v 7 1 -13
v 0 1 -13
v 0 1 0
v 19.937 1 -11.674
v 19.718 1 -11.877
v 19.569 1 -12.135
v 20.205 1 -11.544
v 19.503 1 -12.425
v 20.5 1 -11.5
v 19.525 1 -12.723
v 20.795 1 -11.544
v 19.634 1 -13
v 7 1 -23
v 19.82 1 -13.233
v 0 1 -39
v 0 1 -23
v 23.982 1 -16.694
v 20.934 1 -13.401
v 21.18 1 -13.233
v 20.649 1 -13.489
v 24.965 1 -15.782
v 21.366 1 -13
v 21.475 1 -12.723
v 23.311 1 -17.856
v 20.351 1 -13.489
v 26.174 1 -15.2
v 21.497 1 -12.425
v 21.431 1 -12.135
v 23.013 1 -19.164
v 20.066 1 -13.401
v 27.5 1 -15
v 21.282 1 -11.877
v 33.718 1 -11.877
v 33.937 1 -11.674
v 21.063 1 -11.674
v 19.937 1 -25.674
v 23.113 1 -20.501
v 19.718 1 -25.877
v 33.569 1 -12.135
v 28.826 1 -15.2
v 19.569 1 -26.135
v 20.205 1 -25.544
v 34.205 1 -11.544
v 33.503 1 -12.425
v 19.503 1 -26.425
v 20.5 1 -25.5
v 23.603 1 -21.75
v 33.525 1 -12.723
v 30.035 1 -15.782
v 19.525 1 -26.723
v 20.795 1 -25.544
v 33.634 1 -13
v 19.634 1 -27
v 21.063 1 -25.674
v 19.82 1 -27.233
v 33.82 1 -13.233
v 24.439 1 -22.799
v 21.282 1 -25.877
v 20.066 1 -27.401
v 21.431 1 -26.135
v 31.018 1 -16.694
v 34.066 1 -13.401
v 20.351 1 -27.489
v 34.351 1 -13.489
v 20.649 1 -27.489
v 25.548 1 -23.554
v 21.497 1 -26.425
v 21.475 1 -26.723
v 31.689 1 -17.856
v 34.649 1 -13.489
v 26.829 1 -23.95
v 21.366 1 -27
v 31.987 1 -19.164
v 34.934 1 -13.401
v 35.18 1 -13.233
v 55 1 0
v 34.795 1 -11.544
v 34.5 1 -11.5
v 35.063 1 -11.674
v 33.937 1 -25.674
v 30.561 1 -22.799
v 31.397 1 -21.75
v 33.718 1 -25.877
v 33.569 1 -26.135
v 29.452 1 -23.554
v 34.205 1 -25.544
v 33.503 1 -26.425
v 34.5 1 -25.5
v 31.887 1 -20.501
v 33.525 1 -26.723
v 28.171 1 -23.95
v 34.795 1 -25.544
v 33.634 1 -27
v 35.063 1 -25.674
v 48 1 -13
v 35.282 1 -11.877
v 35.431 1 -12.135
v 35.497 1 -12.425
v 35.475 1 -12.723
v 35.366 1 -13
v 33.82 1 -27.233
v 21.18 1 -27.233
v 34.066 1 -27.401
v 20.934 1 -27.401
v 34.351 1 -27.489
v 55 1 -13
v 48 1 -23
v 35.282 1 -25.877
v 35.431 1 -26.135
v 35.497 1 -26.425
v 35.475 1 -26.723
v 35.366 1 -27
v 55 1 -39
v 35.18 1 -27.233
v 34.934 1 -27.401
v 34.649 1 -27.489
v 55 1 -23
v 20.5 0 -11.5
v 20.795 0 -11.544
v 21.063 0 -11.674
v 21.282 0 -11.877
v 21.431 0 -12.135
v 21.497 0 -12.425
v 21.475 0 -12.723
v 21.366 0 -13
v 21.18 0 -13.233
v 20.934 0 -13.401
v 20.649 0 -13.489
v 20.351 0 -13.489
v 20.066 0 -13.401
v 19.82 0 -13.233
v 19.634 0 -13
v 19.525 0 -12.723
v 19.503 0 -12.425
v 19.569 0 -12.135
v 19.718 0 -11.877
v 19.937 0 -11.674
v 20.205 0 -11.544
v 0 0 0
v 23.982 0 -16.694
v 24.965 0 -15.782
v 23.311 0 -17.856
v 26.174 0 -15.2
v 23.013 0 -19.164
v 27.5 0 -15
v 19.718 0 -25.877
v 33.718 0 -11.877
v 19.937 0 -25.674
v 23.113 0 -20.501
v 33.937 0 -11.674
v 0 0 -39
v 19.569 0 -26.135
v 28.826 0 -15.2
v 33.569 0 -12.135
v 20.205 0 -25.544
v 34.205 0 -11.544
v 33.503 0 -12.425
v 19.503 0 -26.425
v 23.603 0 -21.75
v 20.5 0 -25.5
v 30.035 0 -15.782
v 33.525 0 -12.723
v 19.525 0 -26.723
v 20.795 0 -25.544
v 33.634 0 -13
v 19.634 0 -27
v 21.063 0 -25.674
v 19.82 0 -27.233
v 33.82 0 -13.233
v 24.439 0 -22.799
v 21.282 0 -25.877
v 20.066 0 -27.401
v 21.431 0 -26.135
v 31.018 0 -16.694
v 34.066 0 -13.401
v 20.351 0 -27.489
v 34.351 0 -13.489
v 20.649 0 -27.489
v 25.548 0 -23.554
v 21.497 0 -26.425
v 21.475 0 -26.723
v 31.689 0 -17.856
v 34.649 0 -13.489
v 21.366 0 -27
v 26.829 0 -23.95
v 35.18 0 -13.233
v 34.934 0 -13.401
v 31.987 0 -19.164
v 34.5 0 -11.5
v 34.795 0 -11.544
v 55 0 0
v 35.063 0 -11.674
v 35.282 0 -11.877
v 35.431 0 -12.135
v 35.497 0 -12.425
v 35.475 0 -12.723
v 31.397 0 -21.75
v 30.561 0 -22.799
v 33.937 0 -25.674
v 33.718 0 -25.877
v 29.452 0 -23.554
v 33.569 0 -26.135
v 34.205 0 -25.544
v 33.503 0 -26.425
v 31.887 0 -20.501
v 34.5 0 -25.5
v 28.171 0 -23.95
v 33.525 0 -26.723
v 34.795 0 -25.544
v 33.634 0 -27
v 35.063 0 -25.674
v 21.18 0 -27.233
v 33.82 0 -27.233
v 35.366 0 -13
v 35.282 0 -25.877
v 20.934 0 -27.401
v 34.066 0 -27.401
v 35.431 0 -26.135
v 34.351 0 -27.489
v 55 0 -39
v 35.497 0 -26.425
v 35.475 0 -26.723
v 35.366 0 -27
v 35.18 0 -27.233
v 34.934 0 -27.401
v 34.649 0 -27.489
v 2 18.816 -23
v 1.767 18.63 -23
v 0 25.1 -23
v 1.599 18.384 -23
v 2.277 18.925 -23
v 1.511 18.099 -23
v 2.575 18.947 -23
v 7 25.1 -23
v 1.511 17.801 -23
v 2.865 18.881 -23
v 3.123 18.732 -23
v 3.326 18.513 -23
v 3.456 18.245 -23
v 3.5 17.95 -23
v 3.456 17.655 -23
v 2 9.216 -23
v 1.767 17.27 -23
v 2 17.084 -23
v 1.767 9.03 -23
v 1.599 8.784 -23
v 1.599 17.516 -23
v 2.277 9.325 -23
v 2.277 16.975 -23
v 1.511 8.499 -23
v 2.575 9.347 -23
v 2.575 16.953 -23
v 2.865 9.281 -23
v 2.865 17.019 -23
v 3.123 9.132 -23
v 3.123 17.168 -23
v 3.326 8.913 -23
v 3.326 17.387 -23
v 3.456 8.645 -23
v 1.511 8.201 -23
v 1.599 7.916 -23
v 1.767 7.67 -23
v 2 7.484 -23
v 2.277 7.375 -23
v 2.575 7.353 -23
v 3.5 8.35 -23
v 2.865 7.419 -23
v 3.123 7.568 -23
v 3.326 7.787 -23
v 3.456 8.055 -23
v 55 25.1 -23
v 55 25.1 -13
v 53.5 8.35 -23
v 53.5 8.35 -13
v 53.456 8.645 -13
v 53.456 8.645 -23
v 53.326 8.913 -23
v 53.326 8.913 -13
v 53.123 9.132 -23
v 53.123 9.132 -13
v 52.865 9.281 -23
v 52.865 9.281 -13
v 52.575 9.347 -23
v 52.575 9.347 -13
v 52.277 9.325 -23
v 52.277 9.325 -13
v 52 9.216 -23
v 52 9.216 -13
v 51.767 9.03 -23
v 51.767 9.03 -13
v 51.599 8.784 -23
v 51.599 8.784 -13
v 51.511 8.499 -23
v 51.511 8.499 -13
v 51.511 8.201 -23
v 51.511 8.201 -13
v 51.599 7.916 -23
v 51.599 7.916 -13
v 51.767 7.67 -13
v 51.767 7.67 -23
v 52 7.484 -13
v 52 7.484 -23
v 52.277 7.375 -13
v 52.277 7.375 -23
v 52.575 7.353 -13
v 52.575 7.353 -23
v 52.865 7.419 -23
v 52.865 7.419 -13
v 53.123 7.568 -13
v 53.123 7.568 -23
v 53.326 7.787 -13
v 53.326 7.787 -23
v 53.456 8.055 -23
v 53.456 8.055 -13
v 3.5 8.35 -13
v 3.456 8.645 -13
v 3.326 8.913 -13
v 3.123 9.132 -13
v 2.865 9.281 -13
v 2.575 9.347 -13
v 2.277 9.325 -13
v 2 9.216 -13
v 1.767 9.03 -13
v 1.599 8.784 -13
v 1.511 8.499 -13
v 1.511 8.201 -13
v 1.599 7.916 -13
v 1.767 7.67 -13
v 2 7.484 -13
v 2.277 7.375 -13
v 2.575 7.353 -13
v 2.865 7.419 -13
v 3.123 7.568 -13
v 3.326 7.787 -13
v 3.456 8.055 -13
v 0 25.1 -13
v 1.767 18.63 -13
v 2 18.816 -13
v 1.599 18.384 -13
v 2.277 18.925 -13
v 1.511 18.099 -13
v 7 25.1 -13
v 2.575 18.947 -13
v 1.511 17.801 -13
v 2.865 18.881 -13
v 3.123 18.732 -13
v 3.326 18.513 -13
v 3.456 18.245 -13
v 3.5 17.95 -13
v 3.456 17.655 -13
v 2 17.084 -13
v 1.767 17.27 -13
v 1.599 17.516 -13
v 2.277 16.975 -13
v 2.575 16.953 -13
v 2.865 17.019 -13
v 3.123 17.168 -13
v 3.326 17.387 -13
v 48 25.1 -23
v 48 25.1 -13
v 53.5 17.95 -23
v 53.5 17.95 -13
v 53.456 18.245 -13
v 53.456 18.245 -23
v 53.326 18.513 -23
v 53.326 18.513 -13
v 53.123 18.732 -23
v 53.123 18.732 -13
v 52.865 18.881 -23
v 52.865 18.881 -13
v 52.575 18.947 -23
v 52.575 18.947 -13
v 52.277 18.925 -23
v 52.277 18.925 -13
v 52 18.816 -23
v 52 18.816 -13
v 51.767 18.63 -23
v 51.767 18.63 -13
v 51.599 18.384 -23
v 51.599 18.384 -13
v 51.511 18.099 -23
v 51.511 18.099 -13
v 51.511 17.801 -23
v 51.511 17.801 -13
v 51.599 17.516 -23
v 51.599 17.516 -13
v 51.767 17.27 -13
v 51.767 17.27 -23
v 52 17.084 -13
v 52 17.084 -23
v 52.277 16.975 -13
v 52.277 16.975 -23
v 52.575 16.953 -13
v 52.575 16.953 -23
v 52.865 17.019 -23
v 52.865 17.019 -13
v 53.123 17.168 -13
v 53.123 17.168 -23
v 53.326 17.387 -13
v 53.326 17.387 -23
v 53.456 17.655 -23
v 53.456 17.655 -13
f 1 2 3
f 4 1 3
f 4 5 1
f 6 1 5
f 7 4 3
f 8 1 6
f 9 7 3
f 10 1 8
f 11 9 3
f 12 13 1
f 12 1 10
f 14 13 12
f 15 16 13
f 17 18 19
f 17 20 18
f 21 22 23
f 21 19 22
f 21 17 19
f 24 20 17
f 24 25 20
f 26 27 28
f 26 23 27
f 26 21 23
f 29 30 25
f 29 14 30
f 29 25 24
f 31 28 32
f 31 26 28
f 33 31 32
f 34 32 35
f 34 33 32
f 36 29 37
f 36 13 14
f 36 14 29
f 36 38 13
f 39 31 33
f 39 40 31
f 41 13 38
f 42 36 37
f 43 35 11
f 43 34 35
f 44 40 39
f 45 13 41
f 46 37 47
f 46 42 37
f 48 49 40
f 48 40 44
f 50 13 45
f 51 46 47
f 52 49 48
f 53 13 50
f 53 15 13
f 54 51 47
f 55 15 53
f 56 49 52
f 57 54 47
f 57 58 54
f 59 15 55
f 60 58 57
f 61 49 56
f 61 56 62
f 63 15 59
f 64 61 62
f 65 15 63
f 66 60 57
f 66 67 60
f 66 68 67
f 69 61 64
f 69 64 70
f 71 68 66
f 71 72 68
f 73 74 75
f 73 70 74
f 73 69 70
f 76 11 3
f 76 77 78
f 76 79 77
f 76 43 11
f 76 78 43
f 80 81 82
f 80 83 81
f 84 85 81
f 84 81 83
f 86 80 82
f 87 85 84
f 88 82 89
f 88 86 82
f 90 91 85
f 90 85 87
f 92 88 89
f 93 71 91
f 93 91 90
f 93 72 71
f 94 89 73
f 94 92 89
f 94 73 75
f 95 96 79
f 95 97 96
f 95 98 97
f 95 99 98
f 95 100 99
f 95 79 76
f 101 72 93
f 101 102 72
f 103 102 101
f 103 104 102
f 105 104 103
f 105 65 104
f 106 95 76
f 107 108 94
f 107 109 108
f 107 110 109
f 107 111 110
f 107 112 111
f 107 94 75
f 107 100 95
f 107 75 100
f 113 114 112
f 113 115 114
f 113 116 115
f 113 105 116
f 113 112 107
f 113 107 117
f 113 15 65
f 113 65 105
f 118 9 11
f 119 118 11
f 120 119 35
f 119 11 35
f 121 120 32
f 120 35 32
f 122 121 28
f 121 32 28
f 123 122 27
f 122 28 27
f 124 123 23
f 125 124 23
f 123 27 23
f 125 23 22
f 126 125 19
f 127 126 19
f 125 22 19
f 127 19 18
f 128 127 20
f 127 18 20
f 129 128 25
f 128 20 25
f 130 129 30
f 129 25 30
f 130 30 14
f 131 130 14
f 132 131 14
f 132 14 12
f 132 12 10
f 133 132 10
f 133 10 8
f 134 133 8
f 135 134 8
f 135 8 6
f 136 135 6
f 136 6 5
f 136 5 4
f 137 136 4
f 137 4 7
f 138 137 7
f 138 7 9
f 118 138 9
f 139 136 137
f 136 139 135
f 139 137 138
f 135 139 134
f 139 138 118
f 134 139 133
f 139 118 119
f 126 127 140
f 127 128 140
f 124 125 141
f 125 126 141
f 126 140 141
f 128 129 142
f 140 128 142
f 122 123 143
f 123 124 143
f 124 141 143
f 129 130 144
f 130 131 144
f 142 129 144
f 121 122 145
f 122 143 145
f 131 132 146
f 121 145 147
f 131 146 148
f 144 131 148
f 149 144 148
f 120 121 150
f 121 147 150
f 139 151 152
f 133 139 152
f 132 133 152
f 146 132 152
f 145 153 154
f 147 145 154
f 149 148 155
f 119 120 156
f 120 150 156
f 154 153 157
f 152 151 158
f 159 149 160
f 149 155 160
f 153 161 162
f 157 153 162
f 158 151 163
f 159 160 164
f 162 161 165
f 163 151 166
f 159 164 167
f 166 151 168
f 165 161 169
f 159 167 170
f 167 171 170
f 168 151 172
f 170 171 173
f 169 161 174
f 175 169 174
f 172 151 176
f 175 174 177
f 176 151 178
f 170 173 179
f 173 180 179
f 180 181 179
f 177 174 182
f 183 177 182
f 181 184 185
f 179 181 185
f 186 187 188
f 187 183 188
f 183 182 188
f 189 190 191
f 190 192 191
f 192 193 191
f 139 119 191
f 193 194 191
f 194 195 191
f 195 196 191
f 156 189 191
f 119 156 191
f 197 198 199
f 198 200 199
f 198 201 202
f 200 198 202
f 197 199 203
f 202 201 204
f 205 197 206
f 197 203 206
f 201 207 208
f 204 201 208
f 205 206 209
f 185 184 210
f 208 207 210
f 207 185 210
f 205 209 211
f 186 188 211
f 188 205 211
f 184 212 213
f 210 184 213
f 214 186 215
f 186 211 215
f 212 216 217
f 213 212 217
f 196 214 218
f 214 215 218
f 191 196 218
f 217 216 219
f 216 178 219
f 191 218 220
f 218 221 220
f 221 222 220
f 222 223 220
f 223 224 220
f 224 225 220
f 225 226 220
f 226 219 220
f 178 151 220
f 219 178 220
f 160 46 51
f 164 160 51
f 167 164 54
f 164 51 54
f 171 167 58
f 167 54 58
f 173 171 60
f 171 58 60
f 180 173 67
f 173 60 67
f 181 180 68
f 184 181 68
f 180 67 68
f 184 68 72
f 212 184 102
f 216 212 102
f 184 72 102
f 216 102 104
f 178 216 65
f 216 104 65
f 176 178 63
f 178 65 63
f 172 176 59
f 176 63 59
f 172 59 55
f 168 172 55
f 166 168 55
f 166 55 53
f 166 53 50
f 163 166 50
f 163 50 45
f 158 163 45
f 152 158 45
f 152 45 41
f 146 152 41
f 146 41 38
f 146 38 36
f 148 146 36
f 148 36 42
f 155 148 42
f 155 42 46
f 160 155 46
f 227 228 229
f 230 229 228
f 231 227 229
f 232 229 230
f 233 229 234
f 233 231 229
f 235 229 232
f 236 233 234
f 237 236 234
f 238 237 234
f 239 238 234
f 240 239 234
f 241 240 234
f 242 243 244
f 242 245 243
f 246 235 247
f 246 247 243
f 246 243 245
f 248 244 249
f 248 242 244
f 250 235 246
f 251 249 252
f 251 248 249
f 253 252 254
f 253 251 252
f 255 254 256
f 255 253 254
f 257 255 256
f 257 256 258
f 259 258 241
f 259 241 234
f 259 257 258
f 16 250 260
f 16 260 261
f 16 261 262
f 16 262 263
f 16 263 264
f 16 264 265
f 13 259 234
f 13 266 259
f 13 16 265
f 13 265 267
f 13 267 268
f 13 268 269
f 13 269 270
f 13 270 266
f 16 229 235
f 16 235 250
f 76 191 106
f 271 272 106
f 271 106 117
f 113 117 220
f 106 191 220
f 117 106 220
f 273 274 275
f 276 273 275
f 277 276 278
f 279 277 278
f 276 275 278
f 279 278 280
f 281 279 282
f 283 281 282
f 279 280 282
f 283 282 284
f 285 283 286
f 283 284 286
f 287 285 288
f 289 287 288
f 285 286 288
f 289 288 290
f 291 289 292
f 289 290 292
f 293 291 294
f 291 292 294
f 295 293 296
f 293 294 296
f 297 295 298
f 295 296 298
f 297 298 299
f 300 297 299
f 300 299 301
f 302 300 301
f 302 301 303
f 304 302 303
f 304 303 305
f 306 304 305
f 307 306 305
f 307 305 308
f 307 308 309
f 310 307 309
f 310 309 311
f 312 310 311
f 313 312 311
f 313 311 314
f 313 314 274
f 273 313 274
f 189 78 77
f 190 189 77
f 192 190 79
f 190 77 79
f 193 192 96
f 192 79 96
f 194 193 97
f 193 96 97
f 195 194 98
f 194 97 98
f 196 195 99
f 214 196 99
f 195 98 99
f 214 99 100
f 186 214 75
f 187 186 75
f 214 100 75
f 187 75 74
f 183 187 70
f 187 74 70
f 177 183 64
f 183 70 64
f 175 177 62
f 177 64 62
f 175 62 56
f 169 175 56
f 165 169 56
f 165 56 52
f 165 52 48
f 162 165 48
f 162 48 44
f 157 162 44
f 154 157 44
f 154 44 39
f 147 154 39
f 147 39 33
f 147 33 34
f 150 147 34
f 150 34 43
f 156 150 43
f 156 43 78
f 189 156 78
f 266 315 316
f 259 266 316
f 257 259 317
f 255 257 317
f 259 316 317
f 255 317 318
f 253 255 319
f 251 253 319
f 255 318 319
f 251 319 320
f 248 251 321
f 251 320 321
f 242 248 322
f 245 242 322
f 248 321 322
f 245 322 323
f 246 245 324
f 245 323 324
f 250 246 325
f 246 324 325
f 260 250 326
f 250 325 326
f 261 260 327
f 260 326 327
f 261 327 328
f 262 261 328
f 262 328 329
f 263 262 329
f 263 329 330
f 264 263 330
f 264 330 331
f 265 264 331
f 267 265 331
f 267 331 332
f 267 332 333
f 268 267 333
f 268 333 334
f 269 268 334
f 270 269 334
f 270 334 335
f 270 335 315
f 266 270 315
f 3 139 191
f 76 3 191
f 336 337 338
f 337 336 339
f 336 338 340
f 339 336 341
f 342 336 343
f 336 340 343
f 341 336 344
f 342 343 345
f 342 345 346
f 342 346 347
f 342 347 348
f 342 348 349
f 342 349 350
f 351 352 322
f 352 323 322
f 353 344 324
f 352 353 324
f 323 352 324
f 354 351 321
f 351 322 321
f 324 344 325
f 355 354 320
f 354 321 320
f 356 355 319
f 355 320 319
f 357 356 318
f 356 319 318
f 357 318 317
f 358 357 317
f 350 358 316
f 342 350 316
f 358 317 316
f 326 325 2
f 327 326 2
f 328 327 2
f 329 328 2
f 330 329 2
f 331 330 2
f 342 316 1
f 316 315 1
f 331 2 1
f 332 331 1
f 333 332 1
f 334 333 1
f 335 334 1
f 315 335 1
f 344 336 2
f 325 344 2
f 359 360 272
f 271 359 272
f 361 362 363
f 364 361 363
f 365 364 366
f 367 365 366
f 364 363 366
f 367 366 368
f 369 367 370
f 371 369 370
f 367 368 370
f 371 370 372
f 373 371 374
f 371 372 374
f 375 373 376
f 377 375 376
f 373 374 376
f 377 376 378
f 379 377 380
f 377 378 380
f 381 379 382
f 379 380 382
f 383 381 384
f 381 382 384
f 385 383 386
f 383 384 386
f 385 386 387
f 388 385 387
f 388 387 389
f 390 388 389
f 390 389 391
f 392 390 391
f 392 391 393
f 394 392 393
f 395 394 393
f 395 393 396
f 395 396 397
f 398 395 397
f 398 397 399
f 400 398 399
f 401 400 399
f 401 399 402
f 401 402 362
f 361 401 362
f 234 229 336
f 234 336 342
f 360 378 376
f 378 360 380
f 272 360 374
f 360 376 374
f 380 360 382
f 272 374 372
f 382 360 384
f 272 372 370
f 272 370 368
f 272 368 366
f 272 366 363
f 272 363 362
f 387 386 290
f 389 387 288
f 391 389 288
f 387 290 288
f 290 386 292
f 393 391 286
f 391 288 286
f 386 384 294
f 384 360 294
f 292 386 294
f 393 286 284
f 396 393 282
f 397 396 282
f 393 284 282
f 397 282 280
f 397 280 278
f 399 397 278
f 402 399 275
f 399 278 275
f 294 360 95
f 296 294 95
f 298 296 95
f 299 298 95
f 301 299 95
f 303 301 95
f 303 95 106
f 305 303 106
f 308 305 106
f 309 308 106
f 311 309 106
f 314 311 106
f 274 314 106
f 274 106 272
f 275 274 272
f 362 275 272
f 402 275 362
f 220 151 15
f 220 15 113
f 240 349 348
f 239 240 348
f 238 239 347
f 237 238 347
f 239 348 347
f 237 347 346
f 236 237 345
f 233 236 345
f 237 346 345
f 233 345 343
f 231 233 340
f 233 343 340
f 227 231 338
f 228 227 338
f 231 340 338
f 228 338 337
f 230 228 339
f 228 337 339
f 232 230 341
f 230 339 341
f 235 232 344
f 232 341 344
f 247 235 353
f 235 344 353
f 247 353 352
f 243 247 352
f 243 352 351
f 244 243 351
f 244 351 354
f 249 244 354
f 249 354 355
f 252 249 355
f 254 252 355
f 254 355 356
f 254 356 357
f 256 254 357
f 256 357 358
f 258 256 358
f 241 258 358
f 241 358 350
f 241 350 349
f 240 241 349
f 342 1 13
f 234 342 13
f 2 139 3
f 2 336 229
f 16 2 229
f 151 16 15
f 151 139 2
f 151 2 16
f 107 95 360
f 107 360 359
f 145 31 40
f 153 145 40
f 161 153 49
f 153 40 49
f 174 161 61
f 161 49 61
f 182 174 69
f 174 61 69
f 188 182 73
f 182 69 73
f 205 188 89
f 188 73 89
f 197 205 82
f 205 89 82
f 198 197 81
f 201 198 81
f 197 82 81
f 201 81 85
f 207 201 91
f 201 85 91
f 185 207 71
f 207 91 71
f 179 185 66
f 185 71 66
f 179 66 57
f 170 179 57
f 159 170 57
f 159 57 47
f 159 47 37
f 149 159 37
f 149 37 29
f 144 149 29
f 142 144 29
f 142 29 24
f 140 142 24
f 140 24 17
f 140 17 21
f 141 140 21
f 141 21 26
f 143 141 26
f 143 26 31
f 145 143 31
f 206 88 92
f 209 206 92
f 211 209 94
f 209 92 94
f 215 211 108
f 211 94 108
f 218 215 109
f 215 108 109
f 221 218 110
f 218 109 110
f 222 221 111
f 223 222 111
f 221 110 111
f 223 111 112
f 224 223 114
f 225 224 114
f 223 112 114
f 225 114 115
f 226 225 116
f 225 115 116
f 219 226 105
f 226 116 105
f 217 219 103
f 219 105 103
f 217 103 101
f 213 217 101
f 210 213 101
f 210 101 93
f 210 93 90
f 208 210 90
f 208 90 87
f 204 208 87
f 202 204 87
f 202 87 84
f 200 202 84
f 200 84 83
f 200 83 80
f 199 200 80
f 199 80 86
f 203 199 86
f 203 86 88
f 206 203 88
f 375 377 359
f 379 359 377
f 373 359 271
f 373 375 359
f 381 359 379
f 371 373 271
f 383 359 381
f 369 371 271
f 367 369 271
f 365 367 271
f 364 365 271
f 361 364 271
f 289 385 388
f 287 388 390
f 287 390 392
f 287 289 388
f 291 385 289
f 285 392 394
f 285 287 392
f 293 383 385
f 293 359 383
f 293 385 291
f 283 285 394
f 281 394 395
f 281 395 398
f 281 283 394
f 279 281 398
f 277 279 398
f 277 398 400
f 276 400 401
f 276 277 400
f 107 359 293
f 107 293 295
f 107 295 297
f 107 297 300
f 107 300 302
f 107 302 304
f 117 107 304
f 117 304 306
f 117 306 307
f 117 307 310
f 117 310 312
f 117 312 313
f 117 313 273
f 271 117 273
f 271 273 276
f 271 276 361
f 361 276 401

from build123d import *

# Parameters (mm, degrees)
SKETCH1_W           = 55
SKETCH1_H           = 39
BOSS_EXTRUDE1_DEPTH = 1
CUT_EXTRUDE1_REACH  = 69.431
SKETCH3_R           = 1
SKETCH3_R_2         = 4.5
SKETCH2_W           = 7
SKETCH2_H           = 10
BOSS_EXTRUDE2_DEPTH = 24.1
CUT_EXTRUDE2_REACH  = 67.81
SKETCH4_R           = 1


with BuildPart() as part:
    # Sketch1 → Boss-Extrude1 (new body)
    with BuildSketch(Plane(origin=(0, 0, 0), x_dir=(1, 0, 0), z_dir=(0, 1, 0))):
        with Locations((27.5, 19.5)):
            Rectangle(SKETCH1_W, SKETCH1_H)
    extrude(amount=BOSS_EXTRUDE1_DEPTH)

    # Sketch3 → Cut-Extrude1 (cut, up to next)
    with BuildSketch(Plane(origin=(0, 1, 0), x_dir=(1, 0, 0), z_dir=(0, 1, 0)), mode=Mode.PRIVATE) as cut_extrude1_sk1:
        with Locations(Location((34.5, 26.5, 0), (0, 0, 270))):
            Circle(SKETCH3_R)
    cut_extrude1_tool1 = extrude(cut_extrude1_sk1.sketch, amount=-CUT_EXTRUDE1_REACH, mode=Mode.PRIVATE) & part.part
    # Sketch3 → Cut-Extrude1 (cut, up to next)
    with BuildSketch(Plane(origin=(0, 1, 0), x_dir=(1, 0, 0), z_dir=(0, 1, 0)), mode=Mode.PRIVATE) as cut_extrude1_sk2:
        with Locations(Location((34.5, 12.5, 0), (0, 0, 270))):
            Circle(SKETCH3_R)
    cut_extrude1_tool2 = extrude(cut_extrude1_sk2.sketch, amount=-CUT_EXTRUDE1_REACH, mode=Mode.PRIVATE) & part.part
    # Sketch3 → Cut-Extrude1 (cut, up to next)
    with BuildSketch(Plane(origin=(0, 1, 0), x_dir=(1, 0, 0), z_dir=(0, 1, 0)), mode=Mode.PRIVATE) as cut_extrude1_sk3:
        with Locations(Location((20.5, 12.5, 0), (0, 0, 270))):
            Circle(SKETCH3_R)
    cut_extrude1_tool3 = extrude(cut_extrude1_sk3.sketch, amount=-CUT_EXTRUDE1_REACH, mode=Mode.PRIVATE) & part.part
    # Sketch3 → Cut-Extrude1 (cut, up to next)
    with BuildSketch(Plane(origin=(0, 1, 0), x_dir=(1, 0, 0), z_dir=(0, 1, 0)), mode=Mode.PRIVATE) as cut_extrude1_sk4:
        with Locations(Location((20.5, 26.5, 0), (0, 0, 270))):
            Circle(SKETCH3_R)
    cut_extrude1_tool4 = extrude(cut_extrude1_sk4.sketch, amount=-CUT_EXTRUDE1_REACH, mode=Mode.PRIVATE) & part.part
    # Sketch3 → Cut-Extrude1 (cut, up to next)
    with BuildSketch(Plane(origin=(0, 1, 0), x_dir=(1, 0, 0), z_dir=(0, 1, 0)), mode=Mode.PRIVATE) as cut_extrude1_sk5:
        with Locations(Location((27.5, 19.5, 0), (0, 0, 270))):
            Circle(SKETCH3_R_2)
    cut_extrude1_tool5 = extrude(cut_extrude1_sk5.sketch, amount=-CUT_EXTRUDE1_REACH, mode=Mode.PRIVATE) & part.part
    add(cut_extrude1_tool1.solids().sort_by_distance((34.5, 1, -26.5))[0], mode=Mode.SUBTRACT)
    add(cut_extrude1_tool2.solids().sort_by_distance((34.5, 1, -12.5))[0], mode=Mode.SUBTRACT)
    add(cut_extrude1_tool3.solids().sort_by_distance((20.5, 1, -12.5))[0], mode=Mode.SUBTRACT)
    add(cut_extrude1_tool4.solids().sort_by_distance((20.5, 1, -26.5))[0], mode=Mode.SUBTRACT)
    add(cut_extrude1_tool5.solids().sort_by_distance((27.5, 1, -19.5))[0], mode=Mode.SUBTRACT)

    # Sketch2 → Boss-Extrude2 (add)
    with BuildSketch(Plane(origin=(0, 1, 0), x_dir=(1, 0, 0), z_dir=(0, 1, 0))):
        with Locations((51.5, 18)):
            Rectangle(SKETCH2_W, SKETCH2_H)
        with Locations((3.5, 18)):
            Rectangle(SKETCH2_W, SKETCH2_H)
    extrude(amount=BOSS_EXTRUDE2_DEPTH)

    # Sketch4 → Cut-Extrude2 (cut, up to next)
    with BuildSketch(Plane.XY.offset(-13), mode=Mode.PRIVATE) as cut_extrude2_sk1:
        with Locations((2.5, 17.95)):
            Circle(SKETCH4_R)
    cut_extrude2_tool1 = extrude(cut_extrude2_sk1.sketch, amount=-CUT_EXTRUDE2_REACH, mode=Mode.PRIVATE) & part.part
    # Sketch4 → Cut-Extrude2 (cut, up to next)
    with BuildSketch(Plane.XY.offset(-13), mode=Mode.PRIVATE) as cut_extrude2_sk2:
        with Locations((2.5, 8.35)):
            Circle(SKETCH4_R)
    cut_extrude2_tool2 = extrude(cut_extrude2_sk2.sketch, amount=-CUT_EXTRUDE2_REACH, mode=Mode.PRIVATE) & part.part
    # Sketch4 → Cut-Extrude2 (cut, up to next)
    with BuildSketch(Plane.XY.offset(-13), mode=Mode.PRIVATE) as cut_extrude2_sk3:
        with Locations((52.5, 8.35)):
            Circle(SKETCH4_R)
    cut_extrude2_tool3 = extrude(cut_extrude2_sk3.sketch, amount=-CUT_EXTRUDE2_REACH, mode=Mode.PRIVATE) & part.part
    # Sketch4 → Cut-Extrude2 (cut, up to next)
    with BuildSketch(Plane.XY.offset(-13), mode=Mode.PRIVATE) as cut_extrude2_sk4:
        with Locations((52.5, 17.95)):
            Circle(SKETCH4_R)
    cut_extrude2_tool4 = extrude(cut_extrude2_sk4.sketch, amount=-CUT_EXTRUDE2_REACH, mode=Mode.PRIVATE) & part.part
    add(cut_extrude2_tool1.solids().sort_by_distance((2.5, 17.95, -13))[0], mode=Mode.SUBTRACT)
    add(cut_extrude2_tool2.solids().sort_by_distance((2.5, 8.35, -13))[0], mode=Mode.SUBTRACT)
    add(cut_extrude2_tool3.solids().sort_by_distance((52.5, 8.35, -13))[0], mode=Mode.SUBTRACT)
    add(cut_extrude2_tool4.solids().sort_by_distance((52.5, 17.95, -13))[0], mode=Mode.SUBTRACT)


solid = part.part
